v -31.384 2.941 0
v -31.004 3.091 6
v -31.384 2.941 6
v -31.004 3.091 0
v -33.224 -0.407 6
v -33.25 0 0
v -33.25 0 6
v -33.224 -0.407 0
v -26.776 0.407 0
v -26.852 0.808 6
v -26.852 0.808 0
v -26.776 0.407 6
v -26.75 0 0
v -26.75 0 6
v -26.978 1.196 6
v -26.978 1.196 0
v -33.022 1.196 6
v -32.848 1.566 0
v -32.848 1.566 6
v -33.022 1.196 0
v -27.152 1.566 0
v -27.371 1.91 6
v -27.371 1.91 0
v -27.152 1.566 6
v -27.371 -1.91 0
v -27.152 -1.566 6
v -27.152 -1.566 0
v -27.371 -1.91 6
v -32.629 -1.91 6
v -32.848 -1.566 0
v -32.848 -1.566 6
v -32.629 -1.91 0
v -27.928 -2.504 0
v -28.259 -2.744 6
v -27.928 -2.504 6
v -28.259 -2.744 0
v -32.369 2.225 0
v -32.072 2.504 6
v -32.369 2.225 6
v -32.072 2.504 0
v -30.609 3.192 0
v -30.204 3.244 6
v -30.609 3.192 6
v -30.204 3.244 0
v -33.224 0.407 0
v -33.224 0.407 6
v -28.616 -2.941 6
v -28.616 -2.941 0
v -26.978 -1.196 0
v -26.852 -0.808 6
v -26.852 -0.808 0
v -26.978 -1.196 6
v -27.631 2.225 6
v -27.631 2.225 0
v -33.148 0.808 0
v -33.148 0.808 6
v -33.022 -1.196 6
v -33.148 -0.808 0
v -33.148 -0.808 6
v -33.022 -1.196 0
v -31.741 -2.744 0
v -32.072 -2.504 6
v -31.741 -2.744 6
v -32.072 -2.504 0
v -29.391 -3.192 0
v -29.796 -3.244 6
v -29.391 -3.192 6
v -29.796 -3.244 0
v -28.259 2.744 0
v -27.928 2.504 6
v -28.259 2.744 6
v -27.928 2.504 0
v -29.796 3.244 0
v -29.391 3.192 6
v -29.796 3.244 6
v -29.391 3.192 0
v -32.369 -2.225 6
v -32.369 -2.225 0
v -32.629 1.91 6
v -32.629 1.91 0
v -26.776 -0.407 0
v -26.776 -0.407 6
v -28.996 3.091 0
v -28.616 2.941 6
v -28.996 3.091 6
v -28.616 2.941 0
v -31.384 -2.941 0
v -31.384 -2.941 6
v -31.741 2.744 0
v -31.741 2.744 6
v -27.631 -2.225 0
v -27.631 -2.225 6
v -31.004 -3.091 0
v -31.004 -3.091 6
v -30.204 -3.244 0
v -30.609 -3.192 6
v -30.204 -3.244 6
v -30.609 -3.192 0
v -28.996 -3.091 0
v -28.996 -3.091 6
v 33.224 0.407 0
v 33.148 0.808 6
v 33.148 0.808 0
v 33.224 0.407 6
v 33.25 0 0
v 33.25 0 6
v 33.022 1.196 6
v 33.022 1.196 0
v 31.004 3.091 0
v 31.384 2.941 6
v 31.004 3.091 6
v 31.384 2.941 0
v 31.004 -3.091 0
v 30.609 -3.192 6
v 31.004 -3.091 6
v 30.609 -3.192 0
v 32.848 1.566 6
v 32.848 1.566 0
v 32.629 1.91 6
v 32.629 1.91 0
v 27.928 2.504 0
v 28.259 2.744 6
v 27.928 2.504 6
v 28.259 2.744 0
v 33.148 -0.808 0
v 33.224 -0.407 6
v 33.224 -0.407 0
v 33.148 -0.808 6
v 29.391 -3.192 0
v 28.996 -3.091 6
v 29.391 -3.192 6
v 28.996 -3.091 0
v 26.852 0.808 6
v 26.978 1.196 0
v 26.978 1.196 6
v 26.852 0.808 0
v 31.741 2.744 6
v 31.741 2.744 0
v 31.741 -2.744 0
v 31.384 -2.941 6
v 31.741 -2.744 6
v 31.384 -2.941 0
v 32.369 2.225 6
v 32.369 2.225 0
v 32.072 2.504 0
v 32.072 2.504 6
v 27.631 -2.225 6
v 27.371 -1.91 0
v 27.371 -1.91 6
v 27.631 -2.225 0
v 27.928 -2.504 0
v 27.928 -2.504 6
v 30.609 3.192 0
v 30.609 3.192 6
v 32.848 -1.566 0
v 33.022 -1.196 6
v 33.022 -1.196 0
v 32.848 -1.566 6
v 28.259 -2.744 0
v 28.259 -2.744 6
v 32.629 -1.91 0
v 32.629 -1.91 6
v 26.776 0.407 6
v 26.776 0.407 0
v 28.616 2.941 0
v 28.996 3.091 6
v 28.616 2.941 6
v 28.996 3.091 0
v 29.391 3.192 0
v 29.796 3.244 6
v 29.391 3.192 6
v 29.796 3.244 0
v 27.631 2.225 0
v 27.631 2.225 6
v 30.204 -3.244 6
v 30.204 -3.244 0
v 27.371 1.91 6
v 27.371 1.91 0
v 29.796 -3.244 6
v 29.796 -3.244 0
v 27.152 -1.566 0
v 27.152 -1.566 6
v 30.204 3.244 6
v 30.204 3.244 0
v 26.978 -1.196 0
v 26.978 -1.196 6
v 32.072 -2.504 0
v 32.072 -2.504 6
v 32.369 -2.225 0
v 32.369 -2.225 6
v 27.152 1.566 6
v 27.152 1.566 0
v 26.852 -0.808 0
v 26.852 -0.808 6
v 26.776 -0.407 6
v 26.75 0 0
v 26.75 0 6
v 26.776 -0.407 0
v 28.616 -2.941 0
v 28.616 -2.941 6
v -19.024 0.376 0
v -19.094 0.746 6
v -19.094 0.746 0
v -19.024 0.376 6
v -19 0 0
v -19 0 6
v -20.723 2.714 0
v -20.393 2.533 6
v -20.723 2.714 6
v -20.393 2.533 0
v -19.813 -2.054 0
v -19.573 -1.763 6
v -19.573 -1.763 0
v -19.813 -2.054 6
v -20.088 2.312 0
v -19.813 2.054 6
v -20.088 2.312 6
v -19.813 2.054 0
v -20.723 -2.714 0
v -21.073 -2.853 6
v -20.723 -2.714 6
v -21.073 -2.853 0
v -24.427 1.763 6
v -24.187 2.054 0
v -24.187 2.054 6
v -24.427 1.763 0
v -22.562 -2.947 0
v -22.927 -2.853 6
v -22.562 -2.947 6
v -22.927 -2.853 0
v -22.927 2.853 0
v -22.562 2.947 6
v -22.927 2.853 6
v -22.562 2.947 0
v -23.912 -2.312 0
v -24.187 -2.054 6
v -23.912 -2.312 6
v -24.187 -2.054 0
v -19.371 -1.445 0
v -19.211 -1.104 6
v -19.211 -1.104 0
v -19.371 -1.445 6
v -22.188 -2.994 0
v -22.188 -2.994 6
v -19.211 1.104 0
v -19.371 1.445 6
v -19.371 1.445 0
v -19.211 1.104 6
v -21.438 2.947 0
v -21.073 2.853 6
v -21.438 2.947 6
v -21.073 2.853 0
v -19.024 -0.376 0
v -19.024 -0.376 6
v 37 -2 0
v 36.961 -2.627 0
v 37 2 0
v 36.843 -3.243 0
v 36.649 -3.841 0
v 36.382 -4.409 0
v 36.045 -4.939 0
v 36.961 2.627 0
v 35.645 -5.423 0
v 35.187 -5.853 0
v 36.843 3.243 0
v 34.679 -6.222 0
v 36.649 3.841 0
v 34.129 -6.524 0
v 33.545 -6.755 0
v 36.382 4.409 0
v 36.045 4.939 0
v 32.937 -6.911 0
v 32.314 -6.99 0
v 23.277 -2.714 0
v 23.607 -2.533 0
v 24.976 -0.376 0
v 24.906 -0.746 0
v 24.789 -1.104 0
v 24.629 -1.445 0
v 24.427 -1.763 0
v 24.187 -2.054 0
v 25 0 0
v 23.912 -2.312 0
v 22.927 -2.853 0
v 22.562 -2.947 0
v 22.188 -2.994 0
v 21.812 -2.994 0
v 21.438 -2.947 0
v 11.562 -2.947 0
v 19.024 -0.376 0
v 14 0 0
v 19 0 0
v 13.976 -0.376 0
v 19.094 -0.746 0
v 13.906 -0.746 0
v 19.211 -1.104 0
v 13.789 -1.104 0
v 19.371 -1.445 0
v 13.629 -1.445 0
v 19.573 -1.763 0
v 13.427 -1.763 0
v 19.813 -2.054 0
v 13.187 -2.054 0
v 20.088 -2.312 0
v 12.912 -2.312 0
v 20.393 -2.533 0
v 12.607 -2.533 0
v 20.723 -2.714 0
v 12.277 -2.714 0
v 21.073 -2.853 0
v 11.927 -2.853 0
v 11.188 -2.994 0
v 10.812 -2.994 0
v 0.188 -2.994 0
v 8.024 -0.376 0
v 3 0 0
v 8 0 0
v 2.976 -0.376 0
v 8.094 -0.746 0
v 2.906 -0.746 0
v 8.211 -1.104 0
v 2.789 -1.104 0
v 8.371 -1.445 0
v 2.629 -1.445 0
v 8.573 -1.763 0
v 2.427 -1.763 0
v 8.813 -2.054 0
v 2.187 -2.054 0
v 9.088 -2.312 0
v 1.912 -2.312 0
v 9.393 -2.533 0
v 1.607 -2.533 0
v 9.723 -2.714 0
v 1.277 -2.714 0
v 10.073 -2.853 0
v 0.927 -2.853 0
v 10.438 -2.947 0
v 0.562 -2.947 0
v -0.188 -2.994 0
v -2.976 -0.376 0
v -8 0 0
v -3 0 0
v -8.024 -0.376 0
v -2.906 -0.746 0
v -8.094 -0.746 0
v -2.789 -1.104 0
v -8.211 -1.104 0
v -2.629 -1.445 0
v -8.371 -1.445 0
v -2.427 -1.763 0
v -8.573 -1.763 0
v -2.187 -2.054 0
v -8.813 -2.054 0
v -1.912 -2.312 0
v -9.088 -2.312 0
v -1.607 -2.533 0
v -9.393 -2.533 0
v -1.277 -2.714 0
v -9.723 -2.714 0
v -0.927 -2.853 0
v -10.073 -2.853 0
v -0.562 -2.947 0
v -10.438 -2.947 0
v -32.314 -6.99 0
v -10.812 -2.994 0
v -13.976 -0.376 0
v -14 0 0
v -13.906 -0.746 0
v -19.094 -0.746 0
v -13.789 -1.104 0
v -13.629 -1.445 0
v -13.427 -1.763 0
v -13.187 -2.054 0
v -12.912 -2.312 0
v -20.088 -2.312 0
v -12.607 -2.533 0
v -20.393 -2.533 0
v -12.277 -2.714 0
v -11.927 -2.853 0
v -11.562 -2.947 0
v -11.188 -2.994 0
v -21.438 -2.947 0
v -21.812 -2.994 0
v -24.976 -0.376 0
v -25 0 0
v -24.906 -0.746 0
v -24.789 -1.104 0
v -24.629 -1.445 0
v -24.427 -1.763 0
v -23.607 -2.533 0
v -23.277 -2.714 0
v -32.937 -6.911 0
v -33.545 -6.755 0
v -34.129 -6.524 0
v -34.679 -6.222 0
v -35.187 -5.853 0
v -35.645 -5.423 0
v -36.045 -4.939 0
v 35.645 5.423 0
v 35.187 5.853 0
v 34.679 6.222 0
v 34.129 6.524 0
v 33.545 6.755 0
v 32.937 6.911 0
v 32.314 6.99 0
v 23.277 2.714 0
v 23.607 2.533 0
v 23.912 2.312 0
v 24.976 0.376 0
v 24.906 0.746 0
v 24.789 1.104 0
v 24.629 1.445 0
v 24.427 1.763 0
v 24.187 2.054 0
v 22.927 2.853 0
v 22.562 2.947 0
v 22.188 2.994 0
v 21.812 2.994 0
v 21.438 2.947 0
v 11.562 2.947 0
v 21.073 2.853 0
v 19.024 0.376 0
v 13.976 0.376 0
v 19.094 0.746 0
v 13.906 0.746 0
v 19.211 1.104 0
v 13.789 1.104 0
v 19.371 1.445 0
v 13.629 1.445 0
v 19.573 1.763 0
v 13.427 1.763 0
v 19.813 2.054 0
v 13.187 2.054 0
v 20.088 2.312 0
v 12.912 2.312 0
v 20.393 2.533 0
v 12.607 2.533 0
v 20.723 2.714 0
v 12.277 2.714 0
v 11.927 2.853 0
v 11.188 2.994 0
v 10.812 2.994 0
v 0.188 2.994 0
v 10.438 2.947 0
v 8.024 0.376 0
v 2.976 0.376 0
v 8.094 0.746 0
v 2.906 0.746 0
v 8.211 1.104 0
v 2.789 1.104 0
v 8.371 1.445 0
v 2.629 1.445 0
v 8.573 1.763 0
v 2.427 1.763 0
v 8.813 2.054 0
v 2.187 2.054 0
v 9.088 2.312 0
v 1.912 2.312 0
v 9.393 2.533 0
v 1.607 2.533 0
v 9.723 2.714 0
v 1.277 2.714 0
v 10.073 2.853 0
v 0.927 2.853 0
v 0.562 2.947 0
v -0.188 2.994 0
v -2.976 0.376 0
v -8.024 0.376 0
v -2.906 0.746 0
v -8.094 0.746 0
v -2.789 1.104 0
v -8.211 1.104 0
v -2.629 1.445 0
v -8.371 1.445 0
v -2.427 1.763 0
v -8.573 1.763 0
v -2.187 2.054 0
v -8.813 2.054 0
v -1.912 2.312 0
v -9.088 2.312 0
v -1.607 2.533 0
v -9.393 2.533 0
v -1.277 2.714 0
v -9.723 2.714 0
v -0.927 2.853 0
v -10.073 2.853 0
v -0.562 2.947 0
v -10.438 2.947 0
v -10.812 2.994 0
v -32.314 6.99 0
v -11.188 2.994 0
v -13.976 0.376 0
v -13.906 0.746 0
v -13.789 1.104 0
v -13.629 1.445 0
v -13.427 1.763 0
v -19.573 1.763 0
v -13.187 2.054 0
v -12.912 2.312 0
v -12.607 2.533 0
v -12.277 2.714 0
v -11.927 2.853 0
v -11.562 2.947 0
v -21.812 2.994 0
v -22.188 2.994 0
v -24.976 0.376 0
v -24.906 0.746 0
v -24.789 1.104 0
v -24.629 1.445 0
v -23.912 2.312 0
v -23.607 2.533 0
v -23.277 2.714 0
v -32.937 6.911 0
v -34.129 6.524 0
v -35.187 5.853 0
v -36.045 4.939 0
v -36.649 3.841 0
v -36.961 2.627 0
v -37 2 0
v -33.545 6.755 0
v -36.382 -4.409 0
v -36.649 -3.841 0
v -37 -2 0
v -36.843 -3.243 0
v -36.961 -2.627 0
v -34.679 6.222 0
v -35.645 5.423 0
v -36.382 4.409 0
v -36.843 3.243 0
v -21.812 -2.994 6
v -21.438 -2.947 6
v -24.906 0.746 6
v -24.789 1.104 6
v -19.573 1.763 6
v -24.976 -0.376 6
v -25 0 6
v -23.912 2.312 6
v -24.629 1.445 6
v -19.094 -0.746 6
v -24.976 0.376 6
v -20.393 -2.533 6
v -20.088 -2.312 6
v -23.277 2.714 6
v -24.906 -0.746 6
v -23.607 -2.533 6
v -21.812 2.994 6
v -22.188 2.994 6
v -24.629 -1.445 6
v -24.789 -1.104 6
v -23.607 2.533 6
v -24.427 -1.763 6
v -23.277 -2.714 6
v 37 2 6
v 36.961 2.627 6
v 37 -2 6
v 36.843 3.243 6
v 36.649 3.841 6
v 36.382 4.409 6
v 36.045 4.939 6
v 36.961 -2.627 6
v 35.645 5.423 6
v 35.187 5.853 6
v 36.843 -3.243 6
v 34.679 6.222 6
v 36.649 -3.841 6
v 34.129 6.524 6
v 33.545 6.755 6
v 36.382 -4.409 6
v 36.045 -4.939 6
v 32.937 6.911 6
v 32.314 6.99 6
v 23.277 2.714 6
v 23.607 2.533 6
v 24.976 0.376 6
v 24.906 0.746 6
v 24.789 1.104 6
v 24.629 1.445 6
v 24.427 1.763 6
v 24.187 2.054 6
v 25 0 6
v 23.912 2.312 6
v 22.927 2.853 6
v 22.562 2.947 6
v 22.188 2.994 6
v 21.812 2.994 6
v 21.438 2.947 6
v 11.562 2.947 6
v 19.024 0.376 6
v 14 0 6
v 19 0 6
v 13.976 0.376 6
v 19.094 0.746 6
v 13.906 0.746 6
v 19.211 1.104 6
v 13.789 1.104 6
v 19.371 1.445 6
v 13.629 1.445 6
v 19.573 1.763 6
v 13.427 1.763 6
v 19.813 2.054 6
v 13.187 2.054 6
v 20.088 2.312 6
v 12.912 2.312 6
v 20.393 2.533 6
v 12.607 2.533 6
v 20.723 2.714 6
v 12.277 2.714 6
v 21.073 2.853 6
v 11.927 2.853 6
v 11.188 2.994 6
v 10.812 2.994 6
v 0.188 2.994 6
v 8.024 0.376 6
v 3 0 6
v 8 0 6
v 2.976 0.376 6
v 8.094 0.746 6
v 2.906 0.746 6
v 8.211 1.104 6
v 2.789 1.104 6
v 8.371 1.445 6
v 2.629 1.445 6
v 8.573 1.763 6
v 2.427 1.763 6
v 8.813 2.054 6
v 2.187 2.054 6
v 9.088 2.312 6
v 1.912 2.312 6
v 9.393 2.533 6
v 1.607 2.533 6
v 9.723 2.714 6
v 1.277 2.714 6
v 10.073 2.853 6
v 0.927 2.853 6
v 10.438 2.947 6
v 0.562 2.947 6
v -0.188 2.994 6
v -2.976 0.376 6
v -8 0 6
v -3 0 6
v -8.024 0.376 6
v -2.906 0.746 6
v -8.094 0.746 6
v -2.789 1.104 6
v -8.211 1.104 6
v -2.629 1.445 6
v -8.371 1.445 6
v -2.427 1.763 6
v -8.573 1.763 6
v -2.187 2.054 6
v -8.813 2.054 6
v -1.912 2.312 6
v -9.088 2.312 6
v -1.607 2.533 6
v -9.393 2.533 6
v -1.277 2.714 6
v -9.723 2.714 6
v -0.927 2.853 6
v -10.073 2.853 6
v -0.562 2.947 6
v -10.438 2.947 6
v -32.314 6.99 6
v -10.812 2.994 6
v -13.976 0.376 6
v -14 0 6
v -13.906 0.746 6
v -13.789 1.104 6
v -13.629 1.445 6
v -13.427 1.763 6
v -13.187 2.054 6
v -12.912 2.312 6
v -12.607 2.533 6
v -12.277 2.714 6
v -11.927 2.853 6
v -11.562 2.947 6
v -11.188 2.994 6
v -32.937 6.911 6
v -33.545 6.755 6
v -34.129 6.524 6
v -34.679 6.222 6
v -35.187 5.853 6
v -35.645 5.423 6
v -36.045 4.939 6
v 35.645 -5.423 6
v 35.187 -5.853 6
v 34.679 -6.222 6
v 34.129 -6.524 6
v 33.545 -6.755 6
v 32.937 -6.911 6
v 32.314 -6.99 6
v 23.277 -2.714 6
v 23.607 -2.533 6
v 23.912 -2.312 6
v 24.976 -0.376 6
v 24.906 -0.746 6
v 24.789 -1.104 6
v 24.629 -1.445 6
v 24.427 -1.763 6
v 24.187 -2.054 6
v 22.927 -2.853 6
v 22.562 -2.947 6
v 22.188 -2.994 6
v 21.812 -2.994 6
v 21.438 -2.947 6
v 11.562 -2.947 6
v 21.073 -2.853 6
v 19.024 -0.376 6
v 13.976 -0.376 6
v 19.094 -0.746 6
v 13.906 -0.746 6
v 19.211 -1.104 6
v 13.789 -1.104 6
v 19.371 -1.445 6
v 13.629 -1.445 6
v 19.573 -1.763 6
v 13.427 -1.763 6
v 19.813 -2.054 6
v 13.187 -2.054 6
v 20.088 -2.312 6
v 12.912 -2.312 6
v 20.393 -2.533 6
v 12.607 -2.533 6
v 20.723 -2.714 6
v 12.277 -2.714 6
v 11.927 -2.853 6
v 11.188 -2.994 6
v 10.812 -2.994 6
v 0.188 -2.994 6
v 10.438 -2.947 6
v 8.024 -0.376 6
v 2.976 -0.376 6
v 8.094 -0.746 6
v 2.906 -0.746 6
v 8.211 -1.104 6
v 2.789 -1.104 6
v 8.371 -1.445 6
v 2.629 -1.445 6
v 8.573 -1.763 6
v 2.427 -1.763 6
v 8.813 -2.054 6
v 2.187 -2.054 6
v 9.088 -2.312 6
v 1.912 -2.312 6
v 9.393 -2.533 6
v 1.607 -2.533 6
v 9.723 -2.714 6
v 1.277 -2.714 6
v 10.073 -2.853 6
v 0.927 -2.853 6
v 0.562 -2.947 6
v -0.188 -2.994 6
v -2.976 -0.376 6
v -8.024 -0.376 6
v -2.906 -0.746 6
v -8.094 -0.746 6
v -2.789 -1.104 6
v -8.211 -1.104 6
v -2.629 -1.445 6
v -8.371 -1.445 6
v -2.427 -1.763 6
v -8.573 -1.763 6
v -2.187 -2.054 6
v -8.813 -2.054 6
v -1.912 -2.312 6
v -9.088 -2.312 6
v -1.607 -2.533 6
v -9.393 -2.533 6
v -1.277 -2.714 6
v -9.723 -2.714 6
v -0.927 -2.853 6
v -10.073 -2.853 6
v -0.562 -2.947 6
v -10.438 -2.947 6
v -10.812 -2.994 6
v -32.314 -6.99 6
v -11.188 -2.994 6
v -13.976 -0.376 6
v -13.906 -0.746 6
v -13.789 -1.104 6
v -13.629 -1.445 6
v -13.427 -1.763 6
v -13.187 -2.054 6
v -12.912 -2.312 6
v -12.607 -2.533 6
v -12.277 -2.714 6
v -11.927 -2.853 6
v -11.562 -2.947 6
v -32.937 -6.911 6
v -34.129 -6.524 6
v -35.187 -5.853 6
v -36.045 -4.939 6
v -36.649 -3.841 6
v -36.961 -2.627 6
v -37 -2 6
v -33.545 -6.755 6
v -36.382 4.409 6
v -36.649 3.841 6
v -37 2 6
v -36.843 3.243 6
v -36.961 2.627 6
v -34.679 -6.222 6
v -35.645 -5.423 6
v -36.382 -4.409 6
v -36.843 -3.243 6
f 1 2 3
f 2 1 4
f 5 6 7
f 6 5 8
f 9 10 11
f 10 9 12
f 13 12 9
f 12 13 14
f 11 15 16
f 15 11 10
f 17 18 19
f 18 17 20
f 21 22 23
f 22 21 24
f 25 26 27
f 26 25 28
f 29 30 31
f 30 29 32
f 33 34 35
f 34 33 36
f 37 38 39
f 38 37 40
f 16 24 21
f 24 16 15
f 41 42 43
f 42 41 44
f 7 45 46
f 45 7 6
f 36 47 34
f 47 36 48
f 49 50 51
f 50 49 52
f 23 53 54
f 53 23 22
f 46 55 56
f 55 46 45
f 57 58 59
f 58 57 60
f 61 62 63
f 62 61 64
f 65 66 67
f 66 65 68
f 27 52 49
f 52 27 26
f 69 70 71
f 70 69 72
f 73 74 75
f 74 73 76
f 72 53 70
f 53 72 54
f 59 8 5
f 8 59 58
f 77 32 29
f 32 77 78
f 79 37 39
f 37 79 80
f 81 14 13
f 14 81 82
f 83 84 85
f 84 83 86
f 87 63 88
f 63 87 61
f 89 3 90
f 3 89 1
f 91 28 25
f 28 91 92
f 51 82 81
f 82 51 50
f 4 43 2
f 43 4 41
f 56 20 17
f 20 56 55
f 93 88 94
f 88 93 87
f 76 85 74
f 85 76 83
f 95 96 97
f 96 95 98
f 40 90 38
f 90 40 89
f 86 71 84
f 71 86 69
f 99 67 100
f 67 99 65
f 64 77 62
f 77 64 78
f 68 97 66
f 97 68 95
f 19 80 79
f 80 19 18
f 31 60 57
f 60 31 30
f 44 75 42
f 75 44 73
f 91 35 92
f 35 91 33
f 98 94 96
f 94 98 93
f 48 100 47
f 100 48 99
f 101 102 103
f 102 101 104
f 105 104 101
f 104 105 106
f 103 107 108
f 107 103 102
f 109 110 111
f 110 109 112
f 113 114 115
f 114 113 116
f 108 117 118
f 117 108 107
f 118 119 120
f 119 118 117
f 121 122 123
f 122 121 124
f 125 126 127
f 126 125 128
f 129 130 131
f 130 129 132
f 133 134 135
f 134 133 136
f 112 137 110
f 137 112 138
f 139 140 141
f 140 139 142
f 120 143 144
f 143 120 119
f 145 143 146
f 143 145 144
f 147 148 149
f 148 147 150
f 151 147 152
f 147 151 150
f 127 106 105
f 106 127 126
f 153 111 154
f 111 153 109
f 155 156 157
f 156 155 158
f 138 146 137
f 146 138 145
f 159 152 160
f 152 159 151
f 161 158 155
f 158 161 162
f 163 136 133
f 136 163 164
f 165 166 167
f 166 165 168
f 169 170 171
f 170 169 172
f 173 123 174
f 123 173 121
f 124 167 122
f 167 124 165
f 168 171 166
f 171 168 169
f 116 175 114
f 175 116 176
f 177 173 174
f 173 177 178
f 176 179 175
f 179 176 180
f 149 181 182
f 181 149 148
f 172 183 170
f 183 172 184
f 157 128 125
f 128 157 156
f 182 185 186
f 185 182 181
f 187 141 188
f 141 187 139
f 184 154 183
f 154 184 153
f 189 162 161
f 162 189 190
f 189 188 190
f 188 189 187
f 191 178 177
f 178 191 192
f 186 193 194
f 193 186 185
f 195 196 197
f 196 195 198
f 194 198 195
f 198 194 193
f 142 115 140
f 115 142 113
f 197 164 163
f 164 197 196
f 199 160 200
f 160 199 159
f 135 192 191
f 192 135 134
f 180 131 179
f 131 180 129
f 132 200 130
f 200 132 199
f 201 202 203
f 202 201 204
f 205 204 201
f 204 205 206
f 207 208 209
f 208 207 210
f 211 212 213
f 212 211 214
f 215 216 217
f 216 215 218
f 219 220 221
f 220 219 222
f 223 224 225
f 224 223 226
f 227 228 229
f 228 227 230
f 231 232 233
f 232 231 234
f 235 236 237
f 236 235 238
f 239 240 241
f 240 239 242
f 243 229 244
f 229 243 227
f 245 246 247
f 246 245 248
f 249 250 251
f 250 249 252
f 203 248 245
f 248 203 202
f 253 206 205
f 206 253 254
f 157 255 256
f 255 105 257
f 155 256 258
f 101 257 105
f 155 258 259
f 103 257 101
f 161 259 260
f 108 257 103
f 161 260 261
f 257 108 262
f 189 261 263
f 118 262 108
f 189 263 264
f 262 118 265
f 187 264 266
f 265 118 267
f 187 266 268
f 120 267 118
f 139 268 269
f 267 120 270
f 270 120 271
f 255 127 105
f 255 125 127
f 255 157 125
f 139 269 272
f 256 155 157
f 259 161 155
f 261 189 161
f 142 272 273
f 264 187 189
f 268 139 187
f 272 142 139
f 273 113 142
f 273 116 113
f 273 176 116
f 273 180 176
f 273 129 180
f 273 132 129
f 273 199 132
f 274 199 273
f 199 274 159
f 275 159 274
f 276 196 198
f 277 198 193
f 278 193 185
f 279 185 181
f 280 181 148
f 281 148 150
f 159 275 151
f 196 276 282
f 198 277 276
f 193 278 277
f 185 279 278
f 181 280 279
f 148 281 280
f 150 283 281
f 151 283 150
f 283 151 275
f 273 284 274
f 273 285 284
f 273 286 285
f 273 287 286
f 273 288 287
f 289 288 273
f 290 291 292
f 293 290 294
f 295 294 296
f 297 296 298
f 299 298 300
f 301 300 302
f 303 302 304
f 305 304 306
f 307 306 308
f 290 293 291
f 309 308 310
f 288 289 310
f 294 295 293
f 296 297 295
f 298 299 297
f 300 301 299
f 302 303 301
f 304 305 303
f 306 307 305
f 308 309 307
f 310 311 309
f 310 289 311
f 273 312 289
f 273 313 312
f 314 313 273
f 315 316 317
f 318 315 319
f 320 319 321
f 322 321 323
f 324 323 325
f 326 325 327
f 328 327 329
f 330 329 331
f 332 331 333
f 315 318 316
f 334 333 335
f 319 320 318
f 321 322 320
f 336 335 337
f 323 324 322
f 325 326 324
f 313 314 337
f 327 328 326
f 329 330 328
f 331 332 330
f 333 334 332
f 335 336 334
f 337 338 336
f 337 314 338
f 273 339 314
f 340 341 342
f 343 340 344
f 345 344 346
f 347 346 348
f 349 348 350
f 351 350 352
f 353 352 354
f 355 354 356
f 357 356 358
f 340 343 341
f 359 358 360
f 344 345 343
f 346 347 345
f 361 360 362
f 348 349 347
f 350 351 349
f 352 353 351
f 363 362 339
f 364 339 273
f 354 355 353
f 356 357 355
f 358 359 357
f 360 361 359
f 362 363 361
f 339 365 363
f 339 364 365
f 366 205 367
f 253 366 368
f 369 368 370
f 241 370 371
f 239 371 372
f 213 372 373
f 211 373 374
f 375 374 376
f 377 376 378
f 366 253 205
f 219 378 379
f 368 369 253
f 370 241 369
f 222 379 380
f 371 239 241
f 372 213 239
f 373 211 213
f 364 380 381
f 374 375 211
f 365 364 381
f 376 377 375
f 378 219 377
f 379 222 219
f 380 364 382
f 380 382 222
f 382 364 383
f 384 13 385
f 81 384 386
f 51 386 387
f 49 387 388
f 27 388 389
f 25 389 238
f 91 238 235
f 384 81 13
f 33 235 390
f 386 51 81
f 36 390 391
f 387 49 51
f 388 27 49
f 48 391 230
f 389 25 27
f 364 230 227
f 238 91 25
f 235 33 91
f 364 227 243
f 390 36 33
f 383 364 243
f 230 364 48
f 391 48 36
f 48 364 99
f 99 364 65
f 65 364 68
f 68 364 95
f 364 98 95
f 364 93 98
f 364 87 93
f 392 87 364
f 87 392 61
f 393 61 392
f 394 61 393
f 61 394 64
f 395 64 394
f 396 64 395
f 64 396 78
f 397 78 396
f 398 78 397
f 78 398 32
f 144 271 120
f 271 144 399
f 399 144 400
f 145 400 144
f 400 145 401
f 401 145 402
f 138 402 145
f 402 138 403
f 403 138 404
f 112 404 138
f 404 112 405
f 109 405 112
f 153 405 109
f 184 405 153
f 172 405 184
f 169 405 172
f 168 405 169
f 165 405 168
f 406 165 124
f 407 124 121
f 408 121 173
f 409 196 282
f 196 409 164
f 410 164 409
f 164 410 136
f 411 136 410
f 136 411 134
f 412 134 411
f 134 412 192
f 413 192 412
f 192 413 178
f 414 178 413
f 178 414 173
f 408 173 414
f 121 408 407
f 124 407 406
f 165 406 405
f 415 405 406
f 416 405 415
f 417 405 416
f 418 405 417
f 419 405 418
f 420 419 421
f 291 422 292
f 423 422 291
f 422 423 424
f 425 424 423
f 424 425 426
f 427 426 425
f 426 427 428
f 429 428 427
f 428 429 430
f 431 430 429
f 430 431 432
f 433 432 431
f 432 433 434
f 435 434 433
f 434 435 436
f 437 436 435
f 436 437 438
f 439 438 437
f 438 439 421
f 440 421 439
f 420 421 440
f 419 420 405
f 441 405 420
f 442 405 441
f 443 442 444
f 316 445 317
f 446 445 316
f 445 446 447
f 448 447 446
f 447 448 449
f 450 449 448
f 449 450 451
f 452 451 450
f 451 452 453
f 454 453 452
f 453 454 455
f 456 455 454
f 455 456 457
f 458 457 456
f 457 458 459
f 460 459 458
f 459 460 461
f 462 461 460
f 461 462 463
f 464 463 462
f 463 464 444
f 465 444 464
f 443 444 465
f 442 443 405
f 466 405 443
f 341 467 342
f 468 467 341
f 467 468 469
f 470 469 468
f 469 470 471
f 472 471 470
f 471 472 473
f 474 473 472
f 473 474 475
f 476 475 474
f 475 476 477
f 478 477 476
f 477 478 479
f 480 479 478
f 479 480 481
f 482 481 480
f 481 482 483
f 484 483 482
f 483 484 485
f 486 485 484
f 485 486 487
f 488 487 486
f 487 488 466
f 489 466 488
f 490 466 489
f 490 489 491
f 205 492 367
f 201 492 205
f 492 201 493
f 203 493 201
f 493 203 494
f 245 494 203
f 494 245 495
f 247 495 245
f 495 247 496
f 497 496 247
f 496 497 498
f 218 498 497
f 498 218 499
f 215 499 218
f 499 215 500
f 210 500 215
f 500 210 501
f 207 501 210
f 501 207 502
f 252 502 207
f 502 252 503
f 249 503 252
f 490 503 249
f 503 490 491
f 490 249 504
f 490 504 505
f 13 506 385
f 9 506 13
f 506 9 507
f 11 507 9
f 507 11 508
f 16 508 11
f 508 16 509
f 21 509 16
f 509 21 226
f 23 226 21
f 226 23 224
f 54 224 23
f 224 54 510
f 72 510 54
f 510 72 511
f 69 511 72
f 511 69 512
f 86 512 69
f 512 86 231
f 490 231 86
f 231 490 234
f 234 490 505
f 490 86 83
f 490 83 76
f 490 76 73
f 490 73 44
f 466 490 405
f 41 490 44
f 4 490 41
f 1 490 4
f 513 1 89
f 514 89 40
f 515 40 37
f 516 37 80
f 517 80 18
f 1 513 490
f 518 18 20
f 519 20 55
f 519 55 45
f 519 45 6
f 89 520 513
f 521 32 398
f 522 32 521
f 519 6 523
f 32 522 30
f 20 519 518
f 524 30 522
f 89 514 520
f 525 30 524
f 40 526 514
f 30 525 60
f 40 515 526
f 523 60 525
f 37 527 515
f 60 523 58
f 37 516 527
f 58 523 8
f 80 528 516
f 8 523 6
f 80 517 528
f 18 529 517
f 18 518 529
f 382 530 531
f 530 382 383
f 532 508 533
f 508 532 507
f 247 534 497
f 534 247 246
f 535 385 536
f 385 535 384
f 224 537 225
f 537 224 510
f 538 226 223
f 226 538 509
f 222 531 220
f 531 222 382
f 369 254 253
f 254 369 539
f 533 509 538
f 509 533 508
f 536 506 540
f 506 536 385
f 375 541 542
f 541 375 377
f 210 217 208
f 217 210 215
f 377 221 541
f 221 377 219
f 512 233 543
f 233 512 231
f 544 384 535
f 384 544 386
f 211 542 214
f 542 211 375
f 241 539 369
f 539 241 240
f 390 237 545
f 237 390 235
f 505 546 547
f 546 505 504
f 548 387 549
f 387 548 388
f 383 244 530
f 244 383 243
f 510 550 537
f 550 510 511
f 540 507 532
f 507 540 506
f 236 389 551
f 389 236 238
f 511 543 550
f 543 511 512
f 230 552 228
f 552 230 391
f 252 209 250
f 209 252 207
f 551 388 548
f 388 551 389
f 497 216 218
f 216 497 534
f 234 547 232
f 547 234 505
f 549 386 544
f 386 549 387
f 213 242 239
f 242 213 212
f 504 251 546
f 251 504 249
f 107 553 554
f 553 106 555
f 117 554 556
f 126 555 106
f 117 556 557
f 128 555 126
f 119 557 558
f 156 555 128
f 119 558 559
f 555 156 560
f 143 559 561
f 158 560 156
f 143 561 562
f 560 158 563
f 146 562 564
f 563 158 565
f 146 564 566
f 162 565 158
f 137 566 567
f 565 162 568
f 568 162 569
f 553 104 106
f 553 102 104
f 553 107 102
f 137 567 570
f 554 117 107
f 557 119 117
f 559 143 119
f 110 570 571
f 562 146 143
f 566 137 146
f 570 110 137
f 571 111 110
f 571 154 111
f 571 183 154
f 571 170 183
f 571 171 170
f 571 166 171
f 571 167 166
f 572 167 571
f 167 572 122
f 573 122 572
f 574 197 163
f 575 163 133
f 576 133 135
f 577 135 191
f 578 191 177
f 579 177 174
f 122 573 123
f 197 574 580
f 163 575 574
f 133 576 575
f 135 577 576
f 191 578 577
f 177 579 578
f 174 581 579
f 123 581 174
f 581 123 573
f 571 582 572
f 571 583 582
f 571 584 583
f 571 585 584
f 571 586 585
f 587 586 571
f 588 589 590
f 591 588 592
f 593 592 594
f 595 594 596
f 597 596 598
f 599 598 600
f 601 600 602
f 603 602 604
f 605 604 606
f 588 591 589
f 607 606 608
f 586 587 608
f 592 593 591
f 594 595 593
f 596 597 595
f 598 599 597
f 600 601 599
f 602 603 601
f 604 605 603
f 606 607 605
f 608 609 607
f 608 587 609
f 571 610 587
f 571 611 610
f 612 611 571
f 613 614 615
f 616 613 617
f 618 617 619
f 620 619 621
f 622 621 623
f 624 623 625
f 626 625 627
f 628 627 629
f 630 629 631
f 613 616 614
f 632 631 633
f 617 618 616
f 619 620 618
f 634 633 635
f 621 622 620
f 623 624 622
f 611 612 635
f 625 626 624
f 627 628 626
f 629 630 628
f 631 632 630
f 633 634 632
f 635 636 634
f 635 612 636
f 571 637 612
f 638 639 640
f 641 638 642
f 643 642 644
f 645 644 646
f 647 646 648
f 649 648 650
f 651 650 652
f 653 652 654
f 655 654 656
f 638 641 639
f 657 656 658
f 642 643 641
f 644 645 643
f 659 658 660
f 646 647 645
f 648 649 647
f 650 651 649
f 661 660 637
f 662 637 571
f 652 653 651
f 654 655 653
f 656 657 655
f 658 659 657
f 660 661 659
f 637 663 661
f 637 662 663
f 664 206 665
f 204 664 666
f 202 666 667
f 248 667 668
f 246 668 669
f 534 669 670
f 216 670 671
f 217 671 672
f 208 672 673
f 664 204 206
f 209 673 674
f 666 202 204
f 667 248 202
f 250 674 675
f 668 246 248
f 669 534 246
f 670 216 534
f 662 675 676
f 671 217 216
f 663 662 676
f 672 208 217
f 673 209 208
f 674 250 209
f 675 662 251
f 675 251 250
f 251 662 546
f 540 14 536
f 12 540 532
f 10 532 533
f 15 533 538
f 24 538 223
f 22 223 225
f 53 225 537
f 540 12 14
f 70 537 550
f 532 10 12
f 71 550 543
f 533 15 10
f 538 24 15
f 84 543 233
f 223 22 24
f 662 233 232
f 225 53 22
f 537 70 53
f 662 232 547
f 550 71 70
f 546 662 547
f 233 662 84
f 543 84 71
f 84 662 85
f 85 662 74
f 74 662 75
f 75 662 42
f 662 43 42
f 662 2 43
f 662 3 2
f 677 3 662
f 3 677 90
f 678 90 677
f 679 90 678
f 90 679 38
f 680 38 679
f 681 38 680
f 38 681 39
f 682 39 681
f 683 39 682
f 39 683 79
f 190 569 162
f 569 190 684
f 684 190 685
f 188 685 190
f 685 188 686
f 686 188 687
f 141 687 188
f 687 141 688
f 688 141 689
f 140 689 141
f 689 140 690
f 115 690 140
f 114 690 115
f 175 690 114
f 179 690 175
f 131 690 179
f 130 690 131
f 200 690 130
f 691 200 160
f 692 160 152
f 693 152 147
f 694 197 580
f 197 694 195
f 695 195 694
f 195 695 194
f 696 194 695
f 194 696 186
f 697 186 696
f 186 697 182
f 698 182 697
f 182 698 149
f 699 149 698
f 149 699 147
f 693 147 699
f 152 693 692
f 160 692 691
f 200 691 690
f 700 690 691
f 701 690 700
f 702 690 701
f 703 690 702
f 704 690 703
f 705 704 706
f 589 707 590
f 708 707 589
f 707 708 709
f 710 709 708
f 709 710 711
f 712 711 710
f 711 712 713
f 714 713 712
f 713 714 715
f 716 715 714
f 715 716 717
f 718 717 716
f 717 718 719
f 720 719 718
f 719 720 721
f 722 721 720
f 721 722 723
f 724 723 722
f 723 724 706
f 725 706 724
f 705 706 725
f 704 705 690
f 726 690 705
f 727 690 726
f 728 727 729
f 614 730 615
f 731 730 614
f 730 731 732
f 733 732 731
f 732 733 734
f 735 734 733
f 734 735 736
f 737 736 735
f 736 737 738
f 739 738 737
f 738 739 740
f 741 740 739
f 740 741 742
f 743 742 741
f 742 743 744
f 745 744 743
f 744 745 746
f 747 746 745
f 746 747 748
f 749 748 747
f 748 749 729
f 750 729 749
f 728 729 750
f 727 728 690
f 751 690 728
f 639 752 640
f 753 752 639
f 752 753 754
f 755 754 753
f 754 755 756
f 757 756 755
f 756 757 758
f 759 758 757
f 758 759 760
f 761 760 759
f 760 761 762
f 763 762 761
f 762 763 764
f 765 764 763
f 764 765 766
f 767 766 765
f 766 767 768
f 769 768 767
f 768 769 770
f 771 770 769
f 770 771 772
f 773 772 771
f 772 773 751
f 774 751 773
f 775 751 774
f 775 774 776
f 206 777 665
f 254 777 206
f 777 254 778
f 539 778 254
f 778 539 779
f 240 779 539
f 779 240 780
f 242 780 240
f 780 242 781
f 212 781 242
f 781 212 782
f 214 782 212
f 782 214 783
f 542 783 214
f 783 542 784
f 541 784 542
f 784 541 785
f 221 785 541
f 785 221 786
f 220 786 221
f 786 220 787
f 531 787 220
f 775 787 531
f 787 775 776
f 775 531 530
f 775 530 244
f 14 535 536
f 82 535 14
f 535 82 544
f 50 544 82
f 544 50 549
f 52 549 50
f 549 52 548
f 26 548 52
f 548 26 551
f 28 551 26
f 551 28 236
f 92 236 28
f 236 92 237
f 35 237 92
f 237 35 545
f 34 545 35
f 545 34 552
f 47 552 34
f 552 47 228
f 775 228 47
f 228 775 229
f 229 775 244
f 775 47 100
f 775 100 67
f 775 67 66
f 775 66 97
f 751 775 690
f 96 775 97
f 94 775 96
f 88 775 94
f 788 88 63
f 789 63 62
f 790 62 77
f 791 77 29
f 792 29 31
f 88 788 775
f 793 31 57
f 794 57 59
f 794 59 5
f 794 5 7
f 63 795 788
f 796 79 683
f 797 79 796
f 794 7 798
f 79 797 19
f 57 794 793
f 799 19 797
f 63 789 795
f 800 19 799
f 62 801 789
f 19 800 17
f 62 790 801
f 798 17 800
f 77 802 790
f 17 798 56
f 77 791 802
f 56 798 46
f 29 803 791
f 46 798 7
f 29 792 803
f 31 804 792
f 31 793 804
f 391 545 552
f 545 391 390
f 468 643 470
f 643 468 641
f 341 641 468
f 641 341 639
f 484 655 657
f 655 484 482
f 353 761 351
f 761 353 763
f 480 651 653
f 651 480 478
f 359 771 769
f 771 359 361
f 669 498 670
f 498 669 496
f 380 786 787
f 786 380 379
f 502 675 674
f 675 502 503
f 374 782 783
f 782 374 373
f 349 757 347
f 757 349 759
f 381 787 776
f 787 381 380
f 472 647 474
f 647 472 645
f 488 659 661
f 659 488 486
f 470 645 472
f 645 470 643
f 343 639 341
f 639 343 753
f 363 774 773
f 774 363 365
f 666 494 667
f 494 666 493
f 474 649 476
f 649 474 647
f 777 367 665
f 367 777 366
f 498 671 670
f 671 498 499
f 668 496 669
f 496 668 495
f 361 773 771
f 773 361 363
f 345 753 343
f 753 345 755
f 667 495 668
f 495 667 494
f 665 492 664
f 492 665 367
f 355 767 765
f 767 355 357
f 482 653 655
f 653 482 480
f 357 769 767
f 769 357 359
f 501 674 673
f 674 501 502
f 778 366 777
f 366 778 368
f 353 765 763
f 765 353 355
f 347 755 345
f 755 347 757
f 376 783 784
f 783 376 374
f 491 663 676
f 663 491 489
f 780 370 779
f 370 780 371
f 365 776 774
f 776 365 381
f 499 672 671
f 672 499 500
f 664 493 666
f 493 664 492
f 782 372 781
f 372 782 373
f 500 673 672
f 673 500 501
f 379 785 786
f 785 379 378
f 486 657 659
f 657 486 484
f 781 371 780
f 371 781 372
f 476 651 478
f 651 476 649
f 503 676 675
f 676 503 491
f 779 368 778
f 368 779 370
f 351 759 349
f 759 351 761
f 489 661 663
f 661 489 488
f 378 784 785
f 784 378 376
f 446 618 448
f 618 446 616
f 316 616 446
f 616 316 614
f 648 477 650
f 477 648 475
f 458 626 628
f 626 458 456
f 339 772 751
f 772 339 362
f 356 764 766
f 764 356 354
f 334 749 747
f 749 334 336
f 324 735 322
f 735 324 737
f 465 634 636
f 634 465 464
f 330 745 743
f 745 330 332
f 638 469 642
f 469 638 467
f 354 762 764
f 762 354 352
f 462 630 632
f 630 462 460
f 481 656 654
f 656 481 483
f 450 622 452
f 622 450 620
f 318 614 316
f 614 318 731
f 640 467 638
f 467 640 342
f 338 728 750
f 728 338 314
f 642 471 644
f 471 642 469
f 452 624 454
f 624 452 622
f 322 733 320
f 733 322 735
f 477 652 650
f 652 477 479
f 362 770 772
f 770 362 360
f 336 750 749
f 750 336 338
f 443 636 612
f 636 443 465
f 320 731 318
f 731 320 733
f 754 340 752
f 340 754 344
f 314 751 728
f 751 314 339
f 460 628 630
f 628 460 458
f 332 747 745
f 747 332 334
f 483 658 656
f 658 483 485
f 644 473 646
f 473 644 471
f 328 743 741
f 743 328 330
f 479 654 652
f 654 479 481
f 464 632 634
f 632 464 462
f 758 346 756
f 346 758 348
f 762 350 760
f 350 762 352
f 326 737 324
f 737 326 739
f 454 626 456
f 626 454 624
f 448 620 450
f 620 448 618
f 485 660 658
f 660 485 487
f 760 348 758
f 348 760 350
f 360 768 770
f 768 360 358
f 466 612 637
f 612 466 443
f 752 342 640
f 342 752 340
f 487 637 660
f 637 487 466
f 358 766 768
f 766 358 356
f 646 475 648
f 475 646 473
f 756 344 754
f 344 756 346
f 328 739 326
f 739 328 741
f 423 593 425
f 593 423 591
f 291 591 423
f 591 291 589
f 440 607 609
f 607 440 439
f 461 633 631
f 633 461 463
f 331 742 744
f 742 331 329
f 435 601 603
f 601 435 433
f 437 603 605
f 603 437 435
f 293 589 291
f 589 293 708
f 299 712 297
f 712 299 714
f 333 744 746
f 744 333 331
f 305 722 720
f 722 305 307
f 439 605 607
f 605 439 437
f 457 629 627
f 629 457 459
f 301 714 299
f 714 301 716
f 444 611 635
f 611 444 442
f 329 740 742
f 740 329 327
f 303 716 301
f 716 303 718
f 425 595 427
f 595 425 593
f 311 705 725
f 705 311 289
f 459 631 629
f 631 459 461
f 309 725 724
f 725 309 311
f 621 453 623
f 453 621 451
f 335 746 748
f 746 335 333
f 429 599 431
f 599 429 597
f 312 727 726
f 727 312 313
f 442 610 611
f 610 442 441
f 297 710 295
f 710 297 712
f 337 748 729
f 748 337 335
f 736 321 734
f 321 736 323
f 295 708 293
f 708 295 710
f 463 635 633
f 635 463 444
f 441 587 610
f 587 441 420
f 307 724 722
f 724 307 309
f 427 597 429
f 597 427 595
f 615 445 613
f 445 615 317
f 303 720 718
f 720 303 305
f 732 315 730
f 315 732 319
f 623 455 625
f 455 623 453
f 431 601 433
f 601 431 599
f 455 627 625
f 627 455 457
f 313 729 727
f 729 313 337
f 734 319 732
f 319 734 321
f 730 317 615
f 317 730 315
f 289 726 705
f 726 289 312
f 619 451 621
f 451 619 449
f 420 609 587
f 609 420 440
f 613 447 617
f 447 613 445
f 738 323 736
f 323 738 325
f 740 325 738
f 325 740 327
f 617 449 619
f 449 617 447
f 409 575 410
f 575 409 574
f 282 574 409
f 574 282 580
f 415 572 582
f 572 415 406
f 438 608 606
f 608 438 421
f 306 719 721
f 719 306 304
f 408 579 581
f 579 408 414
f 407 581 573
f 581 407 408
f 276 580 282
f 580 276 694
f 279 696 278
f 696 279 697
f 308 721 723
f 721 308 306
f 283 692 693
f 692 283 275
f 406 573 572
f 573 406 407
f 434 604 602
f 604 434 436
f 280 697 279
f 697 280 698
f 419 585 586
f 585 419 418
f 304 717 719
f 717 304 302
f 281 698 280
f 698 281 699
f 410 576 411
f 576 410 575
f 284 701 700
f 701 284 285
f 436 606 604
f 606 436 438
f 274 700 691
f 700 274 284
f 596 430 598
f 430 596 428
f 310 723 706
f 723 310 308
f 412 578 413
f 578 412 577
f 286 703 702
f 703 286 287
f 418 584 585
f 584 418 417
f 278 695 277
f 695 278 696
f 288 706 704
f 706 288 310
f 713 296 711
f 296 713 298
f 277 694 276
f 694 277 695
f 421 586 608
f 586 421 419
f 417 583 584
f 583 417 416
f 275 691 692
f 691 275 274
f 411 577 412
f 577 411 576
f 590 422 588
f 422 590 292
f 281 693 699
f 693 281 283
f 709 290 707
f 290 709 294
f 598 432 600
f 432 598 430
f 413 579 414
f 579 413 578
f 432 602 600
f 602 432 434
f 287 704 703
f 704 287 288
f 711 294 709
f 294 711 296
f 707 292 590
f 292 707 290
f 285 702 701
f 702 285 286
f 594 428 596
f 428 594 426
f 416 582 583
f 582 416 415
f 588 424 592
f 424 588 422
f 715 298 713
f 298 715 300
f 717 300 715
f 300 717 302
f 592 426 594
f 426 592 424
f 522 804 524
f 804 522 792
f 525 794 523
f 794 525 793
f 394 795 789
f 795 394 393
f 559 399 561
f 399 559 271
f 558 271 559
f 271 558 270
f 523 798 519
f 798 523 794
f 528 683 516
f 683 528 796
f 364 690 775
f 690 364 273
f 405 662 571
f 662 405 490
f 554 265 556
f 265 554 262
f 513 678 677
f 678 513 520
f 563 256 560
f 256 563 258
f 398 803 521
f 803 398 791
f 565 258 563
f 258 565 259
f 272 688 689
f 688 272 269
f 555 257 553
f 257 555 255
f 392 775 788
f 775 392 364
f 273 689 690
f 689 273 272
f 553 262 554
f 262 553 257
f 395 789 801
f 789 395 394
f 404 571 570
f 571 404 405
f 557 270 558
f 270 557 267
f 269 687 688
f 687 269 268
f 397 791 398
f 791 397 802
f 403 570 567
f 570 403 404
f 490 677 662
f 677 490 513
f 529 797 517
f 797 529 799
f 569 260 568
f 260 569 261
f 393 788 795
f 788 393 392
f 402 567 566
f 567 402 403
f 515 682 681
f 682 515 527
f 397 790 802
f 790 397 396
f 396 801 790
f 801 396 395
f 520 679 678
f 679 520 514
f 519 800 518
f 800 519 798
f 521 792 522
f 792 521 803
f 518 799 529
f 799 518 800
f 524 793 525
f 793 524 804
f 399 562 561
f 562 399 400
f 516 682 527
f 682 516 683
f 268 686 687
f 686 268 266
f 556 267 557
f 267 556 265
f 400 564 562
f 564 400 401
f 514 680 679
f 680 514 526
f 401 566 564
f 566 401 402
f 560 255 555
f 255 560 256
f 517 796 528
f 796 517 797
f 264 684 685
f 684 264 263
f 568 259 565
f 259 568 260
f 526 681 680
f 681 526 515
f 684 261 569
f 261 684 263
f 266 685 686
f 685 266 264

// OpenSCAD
$fn = 50;


difference() {
	union() {
		hull() {
			translate(v = [-32.0000000000, 2.0000000000, 0]) {
				cylinder(h = 6, r = 5);
			}
			translate(v = [32.0000000000, 2.0000000000, 0]) {
				cylinder(h = 6, r = 5);
			}
			translate(v = [-32.0000000000, -2.0000000000, 0]) {
				cylinder(h = 6, r = 5);
			}
			translate(v = [32.0000000000, -2.0000000000, 0]) {
				cylinder(h = 6, r = 5);
			}
		}
	}
	union() {
		#translate(v = [-30.0000000000, 0.0000000000, 0]) {
			cylinder(h = 6, r = 3.2500000000);
		}
		#translate(v = [30.0000000000, 0.0000000000, 0]) {
			cylinder(h = 6, r = 3.2500000000);
		}
		#translate(v = [-30.0000000000, 0.0000000000, -100.0000000000]) {
			cylinder(h = 200, r = 3.2500000000);
		}
		#translate(v = [-30.0000000000, 0.0000000000, -100.0000000000]) {
			cylinder(h = 200, r = 3.2500000000);
		}
		#translate(v = [30.0000000000, 0.0000000000, -100.0000000000]) {
			cylinder(h = 200, r = 3.2500000000);
		}
		#translate(v = [30.0000000000, 0.0000000000, -100.0000000000]) {
			cylinder(h = 200, r = 3.2500000000);
		}
		#translate(v = [-30.0000000000, 0.0000000000, 0]) {
			cylinder(h = 6, r = 1.8000000000);
		}
		#translate(v = [30.0000000000, 0.0000000000, 0]) {
			cylinder(h = 6, r = 1.8000000000);
		}
		#translate(v = [-30.0000000000, 0.0000000000, 0]) {
			cylinder(h = 6, r = 1.8000000000);
		}
		#translate(v = [30.0000000000, 0.0000000000, 0]) {
			cylinder(h = 6, r = 1.8000000000);
		}
		#translate(v = [-30.0000000000, 0.0000000000, 0]) {
			cylinder(h = 6, r = 1.8000000000);
		}
		#translate(v = [30.0000000000, 0.0000000000, 0]) {
			cylinder(h = 6, r = 1.8000000000);
		}
		#translate(v = [-22.0000000000, 0, 0]) {
			cylinder(h = 6, r = 3.0000000000);
		}
		#translate(v = [-11.0000000000, 0, 0]) {
			cylinder(h = 6, r = 3.0000000000);
		}
		#cylinder(h = 6, r = 3.0000000000);
		#translate(v = [11.0000000000, 0, 0]) {
			cylinder(h = 6, r = 3.0000000000);
		}
		#translate(v = [22.0000000000, 0, 0]) {
			cylinder(h = 6, r = 3.0000000000);
		}
	}
}
